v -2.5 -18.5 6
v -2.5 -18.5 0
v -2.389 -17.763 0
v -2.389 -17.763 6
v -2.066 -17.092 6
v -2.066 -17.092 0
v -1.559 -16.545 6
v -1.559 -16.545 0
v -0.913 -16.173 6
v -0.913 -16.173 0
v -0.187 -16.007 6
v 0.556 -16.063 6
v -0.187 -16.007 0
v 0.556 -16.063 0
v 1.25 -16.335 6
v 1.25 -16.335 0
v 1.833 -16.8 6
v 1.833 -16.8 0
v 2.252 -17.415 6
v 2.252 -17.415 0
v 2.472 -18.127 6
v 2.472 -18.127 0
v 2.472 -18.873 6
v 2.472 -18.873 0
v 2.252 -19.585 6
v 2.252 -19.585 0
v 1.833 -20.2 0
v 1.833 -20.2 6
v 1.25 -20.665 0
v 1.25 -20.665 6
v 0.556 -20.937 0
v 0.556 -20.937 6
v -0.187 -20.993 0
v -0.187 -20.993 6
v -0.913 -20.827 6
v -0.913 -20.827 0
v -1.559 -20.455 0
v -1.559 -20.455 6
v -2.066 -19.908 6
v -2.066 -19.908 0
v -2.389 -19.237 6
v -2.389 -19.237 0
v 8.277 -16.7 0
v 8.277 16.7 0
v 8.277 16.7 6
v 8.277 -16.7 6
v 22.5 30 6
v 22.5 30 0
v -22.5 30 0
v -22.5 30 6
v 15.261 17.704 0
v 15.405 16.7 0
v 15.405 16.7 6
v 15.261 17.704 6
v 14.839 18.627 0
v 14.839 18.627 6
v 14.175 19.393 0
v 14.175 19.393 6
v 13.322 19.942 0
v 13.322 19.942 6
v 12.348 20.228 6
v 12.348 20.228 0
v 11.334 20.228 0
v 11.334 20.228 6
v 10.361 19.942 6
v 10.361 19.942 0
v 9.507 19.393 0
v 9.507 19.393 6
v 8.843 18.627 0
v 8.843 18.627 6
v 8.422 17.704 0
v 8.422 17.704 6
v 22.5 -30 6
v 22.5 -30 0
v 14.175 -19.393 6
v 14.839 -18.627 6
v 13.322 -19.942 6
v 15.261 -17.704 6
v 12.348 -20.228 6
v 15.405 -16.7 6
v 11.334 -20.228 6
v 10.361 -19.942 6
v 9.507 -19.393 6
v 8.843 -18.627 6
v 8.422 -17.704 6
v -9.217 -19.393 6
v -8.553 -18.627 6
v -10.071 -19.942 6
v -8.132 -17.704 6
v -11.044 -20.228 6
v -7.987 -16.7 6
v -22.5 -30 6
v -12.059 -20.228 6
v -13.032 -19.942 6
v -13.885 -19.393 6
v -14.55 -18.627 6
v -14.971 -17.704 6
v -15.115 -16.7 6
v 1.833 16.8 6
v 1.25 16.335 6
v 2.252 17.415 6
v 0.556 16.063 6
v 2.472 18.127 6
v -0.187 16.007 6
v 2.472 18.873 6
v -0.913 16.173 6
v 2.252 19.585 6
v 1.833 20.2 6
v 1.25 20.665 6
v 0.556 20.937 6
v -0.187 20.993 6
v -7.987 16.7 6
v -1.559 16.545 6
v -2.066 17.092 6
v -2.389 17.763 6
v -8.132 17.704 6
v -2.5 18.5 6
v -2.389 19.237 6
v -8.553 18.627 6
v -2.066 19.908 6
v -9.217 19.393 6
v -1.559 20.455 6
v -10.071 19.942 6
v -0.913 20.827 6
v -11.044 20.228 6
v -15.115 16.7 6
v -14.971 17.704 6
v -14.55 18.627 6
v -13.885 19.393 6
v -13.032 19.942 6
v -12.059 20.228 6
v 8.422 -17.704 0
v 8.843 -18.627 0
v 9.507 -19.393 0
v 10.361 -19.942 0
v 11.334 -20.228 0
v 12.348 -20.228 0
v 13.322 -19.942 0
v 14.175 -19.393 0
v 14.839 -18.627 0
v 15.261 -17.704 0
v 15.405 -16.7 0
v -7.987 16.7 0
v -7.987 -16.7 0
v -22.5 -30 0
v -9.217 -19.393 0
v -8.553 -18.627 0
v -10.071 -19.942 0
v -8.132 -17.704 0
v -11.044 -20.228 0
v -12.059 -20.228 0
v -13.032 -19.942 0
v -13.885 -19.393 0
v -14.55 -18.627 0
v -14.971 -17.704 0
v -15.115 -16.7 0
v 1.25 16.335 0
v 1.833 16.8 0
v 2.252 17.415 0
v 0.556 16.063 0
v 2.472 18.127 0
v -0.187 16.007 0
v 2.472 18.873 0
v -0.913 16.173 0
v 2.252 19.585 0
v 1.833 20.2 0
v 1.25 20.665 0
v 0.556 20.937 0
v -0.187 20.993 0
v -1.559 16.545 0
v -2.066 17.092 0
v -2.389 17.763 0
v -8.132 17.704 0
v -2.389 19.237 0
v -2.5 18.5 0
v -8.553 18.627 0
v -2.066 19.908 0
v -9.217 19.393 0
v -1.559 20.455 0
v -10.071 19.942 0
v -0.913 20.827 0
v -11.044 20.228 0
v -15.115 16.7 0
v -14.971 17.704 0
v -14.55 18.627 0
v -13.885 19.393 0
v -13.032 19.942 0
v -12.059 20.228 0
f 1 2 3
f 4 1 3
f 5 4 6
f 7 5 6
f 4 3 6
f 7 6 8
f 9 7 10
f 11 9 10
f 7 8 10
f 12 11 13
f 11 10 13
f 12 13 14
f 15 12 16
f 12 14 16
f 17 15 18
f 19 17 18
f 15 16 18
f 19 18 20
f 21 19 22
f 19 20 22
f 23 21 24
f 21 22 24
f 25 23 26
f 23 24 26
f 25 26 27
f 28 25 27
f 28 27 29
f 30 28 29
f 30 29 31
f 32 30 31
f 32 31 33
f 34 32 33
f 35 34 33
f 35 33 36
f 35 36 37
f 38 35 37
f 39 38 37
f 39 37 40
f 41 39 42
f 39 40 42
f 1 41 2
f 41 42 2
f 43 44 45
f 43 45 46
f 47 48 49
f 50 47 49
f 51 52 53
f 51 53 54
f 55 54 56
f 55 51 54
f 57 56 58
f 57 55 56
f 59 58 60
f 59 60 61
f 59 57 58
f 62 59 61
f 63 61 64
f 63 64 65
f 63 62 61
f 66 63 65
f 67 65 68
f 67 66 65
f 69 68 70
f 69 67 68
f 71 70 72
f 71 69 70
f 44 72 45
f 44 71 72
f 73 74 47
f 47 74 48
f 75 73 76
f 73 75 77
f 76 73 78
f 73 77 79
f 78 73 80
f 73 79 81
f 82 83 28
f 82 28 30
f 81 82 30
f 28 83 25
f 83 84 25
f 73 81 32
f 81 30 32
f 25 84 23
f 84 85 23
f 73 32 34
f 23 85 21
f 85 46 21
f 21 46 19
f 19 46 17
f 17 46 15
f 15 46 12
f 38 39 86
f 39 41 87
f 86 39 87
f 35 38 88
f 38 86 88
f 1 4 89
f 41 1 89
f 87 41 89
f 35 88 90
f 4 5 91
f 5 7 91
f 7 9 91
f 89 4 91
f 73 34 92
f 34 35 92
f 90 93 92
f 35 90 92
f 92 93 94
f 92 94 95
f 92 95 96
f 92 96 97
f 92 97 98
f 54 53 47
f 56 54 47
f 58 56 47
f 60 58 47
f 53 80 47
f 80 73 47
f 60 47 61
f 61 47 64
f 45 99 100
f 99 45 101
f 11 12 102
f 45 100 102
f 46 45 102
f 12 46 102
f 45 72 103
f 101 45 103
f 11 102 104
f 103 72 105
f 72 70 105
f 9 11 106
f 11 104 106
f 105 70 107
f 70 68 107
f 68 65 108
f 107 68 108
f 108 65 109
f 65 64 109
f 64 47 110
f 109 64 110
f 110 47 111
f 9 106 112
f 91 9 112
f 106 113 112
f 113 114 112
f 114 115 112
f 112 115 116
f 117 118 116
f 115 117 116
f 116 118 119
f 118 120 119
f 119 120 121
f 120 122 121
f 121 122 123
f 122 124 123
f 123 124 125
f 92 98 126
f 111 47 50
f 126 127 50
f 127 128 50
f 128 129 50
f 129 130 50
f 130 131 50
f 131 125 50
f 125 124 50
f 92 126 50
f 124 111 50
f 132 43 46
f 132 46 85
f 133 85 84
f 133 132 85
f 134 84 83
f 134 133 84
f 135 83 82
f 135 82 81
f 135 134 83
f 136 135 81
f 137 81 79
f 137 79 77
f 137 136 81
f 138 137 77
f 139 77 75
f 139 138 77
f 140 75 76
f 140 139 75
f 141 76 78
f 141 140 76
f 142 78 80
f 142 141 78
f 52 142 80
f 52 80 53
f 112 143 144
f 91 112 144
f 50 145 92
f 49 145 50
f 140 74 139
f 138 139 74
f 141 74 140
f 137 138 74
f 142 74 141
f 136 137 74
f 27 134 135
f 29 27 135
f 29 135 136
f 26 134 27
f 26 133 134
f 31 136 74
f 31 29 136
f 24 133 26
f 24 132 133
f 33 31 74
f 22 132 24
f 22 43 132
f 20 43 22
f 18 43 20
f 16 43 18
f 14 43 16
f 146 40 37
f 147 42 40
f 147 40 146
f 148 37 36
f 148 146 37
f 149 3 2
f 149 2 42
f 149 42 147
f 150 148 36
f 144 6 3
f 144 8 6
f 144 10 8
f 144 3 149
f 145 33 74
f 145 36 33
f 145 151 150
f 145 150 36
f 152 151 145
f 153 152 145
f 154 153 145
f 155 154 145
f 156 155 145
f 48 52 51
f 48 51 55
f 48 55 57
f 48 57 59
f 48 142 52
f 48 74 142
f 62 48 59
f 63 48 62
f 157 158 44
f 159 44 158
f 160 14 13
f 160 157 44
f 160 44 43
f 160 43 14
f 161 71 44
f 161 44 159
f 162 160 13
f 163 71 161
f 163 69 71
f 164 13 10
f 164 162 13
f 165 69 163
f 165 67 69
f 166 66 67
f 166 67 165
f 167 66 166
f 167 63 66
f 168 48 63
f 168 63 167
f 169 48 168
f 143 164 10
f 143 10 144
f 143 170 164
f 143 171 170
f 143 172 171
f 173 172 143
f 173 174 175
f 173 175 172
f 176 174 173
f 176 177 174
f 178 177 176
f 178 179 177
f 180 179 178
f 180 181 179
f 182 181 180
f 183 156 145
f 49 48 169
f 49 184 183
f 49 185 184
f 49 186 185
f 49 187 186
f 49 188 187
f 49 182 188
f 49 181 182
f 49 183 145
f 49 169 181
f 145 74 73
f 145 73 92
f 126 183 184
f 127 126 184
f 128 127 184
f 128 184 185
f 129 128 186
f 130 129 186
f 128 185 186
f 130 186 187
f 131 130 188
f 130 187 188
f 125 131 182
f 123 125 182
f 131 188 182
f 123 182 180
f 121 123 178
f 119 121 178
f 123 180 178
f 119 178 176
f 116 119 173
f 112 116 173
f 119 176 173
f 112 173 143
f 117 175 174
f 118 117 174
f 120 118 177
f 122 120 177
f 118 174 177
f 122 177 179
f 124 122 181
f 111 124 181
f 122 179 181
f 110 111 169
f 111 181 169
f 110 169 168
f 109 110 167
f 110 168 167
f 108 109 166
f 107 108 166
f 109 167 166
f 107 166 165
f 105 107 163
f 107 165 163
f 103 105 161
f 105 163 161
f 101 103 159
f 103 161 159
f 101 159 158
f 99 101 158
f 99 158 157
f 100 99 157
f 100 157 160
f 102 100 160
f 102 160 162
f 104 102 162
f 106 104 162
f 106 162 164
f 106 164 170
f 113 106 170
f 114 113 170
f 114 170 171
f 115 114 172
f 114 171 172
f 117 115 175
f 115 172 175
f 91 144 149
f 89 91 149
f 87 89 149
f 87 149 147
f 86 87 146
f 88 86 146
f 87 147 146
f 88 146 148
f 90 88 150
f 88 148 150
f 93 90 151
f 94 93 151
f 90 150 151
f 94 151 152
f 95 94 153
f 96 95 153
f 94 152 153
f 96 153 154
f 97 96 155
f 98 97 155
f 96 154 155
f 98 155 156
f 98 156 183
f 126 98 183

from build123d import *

# Parameters (mm, degrees)
SKETCH1_W           = 45
SKETCH1_H           = 60
SKETCH1_R           = 2.5
BOSS_EXTRUDE1_DEPTH = 6


with BuildPart() as part:
    # Sketch1 → Boss-Extrude1 (new body)
    with BuildSketch(Plane(origin=(0, 0, 0), x_dir=(-1, 0, 0), z_dir=(0, 0, -1))):
        Rectangle(SKETCH1_W, SKETCH1_H)
        with Locations((0, 18.5)):
            Circle(SKETCH1_R, mode=Mode.SUBTRACT)
        with Locations((0, -18.5)):
            Circle(SKETCH1_R, mode=Mode.SUBTRACT)
        with BuildLine():
            Line((-8.277280201, 16.7), (-8.277280201, -16.7))
            ThreePointArc((-8.277280201, -16.7), (-11.841231537, -20.263951335), (-15.405182872, -16.7))
            Line((-15.405182872, -16.7), (-15.405182872, 16.7))
            ThreePointArc((-15.405182872, 16.7), (-11.841231537, 20.263951335), (-8.277280201, 16.7))
        make_face(mode=Mode.SUBTRACT)
        with BuildLine():
            Line((7.987422003, 16.7), (7.987422003, -16.7))
            ThreePointArc((7.987422003, -16.7), (11.551373339, -20.263951335), (15.115324674, -16.7))
            Line((15.115324674, -16.7), (15.115324674, 16.7))
            ThreePointArc((15.115324674, 16.7), (11.551373339, 20.263951335), (7.987422003, 16.7))
        make_face(mode=Mode.SUBTRACT)
    extrude(amount=-BOSS_EXTRUDE1_DEPTH)


solid = part.part
